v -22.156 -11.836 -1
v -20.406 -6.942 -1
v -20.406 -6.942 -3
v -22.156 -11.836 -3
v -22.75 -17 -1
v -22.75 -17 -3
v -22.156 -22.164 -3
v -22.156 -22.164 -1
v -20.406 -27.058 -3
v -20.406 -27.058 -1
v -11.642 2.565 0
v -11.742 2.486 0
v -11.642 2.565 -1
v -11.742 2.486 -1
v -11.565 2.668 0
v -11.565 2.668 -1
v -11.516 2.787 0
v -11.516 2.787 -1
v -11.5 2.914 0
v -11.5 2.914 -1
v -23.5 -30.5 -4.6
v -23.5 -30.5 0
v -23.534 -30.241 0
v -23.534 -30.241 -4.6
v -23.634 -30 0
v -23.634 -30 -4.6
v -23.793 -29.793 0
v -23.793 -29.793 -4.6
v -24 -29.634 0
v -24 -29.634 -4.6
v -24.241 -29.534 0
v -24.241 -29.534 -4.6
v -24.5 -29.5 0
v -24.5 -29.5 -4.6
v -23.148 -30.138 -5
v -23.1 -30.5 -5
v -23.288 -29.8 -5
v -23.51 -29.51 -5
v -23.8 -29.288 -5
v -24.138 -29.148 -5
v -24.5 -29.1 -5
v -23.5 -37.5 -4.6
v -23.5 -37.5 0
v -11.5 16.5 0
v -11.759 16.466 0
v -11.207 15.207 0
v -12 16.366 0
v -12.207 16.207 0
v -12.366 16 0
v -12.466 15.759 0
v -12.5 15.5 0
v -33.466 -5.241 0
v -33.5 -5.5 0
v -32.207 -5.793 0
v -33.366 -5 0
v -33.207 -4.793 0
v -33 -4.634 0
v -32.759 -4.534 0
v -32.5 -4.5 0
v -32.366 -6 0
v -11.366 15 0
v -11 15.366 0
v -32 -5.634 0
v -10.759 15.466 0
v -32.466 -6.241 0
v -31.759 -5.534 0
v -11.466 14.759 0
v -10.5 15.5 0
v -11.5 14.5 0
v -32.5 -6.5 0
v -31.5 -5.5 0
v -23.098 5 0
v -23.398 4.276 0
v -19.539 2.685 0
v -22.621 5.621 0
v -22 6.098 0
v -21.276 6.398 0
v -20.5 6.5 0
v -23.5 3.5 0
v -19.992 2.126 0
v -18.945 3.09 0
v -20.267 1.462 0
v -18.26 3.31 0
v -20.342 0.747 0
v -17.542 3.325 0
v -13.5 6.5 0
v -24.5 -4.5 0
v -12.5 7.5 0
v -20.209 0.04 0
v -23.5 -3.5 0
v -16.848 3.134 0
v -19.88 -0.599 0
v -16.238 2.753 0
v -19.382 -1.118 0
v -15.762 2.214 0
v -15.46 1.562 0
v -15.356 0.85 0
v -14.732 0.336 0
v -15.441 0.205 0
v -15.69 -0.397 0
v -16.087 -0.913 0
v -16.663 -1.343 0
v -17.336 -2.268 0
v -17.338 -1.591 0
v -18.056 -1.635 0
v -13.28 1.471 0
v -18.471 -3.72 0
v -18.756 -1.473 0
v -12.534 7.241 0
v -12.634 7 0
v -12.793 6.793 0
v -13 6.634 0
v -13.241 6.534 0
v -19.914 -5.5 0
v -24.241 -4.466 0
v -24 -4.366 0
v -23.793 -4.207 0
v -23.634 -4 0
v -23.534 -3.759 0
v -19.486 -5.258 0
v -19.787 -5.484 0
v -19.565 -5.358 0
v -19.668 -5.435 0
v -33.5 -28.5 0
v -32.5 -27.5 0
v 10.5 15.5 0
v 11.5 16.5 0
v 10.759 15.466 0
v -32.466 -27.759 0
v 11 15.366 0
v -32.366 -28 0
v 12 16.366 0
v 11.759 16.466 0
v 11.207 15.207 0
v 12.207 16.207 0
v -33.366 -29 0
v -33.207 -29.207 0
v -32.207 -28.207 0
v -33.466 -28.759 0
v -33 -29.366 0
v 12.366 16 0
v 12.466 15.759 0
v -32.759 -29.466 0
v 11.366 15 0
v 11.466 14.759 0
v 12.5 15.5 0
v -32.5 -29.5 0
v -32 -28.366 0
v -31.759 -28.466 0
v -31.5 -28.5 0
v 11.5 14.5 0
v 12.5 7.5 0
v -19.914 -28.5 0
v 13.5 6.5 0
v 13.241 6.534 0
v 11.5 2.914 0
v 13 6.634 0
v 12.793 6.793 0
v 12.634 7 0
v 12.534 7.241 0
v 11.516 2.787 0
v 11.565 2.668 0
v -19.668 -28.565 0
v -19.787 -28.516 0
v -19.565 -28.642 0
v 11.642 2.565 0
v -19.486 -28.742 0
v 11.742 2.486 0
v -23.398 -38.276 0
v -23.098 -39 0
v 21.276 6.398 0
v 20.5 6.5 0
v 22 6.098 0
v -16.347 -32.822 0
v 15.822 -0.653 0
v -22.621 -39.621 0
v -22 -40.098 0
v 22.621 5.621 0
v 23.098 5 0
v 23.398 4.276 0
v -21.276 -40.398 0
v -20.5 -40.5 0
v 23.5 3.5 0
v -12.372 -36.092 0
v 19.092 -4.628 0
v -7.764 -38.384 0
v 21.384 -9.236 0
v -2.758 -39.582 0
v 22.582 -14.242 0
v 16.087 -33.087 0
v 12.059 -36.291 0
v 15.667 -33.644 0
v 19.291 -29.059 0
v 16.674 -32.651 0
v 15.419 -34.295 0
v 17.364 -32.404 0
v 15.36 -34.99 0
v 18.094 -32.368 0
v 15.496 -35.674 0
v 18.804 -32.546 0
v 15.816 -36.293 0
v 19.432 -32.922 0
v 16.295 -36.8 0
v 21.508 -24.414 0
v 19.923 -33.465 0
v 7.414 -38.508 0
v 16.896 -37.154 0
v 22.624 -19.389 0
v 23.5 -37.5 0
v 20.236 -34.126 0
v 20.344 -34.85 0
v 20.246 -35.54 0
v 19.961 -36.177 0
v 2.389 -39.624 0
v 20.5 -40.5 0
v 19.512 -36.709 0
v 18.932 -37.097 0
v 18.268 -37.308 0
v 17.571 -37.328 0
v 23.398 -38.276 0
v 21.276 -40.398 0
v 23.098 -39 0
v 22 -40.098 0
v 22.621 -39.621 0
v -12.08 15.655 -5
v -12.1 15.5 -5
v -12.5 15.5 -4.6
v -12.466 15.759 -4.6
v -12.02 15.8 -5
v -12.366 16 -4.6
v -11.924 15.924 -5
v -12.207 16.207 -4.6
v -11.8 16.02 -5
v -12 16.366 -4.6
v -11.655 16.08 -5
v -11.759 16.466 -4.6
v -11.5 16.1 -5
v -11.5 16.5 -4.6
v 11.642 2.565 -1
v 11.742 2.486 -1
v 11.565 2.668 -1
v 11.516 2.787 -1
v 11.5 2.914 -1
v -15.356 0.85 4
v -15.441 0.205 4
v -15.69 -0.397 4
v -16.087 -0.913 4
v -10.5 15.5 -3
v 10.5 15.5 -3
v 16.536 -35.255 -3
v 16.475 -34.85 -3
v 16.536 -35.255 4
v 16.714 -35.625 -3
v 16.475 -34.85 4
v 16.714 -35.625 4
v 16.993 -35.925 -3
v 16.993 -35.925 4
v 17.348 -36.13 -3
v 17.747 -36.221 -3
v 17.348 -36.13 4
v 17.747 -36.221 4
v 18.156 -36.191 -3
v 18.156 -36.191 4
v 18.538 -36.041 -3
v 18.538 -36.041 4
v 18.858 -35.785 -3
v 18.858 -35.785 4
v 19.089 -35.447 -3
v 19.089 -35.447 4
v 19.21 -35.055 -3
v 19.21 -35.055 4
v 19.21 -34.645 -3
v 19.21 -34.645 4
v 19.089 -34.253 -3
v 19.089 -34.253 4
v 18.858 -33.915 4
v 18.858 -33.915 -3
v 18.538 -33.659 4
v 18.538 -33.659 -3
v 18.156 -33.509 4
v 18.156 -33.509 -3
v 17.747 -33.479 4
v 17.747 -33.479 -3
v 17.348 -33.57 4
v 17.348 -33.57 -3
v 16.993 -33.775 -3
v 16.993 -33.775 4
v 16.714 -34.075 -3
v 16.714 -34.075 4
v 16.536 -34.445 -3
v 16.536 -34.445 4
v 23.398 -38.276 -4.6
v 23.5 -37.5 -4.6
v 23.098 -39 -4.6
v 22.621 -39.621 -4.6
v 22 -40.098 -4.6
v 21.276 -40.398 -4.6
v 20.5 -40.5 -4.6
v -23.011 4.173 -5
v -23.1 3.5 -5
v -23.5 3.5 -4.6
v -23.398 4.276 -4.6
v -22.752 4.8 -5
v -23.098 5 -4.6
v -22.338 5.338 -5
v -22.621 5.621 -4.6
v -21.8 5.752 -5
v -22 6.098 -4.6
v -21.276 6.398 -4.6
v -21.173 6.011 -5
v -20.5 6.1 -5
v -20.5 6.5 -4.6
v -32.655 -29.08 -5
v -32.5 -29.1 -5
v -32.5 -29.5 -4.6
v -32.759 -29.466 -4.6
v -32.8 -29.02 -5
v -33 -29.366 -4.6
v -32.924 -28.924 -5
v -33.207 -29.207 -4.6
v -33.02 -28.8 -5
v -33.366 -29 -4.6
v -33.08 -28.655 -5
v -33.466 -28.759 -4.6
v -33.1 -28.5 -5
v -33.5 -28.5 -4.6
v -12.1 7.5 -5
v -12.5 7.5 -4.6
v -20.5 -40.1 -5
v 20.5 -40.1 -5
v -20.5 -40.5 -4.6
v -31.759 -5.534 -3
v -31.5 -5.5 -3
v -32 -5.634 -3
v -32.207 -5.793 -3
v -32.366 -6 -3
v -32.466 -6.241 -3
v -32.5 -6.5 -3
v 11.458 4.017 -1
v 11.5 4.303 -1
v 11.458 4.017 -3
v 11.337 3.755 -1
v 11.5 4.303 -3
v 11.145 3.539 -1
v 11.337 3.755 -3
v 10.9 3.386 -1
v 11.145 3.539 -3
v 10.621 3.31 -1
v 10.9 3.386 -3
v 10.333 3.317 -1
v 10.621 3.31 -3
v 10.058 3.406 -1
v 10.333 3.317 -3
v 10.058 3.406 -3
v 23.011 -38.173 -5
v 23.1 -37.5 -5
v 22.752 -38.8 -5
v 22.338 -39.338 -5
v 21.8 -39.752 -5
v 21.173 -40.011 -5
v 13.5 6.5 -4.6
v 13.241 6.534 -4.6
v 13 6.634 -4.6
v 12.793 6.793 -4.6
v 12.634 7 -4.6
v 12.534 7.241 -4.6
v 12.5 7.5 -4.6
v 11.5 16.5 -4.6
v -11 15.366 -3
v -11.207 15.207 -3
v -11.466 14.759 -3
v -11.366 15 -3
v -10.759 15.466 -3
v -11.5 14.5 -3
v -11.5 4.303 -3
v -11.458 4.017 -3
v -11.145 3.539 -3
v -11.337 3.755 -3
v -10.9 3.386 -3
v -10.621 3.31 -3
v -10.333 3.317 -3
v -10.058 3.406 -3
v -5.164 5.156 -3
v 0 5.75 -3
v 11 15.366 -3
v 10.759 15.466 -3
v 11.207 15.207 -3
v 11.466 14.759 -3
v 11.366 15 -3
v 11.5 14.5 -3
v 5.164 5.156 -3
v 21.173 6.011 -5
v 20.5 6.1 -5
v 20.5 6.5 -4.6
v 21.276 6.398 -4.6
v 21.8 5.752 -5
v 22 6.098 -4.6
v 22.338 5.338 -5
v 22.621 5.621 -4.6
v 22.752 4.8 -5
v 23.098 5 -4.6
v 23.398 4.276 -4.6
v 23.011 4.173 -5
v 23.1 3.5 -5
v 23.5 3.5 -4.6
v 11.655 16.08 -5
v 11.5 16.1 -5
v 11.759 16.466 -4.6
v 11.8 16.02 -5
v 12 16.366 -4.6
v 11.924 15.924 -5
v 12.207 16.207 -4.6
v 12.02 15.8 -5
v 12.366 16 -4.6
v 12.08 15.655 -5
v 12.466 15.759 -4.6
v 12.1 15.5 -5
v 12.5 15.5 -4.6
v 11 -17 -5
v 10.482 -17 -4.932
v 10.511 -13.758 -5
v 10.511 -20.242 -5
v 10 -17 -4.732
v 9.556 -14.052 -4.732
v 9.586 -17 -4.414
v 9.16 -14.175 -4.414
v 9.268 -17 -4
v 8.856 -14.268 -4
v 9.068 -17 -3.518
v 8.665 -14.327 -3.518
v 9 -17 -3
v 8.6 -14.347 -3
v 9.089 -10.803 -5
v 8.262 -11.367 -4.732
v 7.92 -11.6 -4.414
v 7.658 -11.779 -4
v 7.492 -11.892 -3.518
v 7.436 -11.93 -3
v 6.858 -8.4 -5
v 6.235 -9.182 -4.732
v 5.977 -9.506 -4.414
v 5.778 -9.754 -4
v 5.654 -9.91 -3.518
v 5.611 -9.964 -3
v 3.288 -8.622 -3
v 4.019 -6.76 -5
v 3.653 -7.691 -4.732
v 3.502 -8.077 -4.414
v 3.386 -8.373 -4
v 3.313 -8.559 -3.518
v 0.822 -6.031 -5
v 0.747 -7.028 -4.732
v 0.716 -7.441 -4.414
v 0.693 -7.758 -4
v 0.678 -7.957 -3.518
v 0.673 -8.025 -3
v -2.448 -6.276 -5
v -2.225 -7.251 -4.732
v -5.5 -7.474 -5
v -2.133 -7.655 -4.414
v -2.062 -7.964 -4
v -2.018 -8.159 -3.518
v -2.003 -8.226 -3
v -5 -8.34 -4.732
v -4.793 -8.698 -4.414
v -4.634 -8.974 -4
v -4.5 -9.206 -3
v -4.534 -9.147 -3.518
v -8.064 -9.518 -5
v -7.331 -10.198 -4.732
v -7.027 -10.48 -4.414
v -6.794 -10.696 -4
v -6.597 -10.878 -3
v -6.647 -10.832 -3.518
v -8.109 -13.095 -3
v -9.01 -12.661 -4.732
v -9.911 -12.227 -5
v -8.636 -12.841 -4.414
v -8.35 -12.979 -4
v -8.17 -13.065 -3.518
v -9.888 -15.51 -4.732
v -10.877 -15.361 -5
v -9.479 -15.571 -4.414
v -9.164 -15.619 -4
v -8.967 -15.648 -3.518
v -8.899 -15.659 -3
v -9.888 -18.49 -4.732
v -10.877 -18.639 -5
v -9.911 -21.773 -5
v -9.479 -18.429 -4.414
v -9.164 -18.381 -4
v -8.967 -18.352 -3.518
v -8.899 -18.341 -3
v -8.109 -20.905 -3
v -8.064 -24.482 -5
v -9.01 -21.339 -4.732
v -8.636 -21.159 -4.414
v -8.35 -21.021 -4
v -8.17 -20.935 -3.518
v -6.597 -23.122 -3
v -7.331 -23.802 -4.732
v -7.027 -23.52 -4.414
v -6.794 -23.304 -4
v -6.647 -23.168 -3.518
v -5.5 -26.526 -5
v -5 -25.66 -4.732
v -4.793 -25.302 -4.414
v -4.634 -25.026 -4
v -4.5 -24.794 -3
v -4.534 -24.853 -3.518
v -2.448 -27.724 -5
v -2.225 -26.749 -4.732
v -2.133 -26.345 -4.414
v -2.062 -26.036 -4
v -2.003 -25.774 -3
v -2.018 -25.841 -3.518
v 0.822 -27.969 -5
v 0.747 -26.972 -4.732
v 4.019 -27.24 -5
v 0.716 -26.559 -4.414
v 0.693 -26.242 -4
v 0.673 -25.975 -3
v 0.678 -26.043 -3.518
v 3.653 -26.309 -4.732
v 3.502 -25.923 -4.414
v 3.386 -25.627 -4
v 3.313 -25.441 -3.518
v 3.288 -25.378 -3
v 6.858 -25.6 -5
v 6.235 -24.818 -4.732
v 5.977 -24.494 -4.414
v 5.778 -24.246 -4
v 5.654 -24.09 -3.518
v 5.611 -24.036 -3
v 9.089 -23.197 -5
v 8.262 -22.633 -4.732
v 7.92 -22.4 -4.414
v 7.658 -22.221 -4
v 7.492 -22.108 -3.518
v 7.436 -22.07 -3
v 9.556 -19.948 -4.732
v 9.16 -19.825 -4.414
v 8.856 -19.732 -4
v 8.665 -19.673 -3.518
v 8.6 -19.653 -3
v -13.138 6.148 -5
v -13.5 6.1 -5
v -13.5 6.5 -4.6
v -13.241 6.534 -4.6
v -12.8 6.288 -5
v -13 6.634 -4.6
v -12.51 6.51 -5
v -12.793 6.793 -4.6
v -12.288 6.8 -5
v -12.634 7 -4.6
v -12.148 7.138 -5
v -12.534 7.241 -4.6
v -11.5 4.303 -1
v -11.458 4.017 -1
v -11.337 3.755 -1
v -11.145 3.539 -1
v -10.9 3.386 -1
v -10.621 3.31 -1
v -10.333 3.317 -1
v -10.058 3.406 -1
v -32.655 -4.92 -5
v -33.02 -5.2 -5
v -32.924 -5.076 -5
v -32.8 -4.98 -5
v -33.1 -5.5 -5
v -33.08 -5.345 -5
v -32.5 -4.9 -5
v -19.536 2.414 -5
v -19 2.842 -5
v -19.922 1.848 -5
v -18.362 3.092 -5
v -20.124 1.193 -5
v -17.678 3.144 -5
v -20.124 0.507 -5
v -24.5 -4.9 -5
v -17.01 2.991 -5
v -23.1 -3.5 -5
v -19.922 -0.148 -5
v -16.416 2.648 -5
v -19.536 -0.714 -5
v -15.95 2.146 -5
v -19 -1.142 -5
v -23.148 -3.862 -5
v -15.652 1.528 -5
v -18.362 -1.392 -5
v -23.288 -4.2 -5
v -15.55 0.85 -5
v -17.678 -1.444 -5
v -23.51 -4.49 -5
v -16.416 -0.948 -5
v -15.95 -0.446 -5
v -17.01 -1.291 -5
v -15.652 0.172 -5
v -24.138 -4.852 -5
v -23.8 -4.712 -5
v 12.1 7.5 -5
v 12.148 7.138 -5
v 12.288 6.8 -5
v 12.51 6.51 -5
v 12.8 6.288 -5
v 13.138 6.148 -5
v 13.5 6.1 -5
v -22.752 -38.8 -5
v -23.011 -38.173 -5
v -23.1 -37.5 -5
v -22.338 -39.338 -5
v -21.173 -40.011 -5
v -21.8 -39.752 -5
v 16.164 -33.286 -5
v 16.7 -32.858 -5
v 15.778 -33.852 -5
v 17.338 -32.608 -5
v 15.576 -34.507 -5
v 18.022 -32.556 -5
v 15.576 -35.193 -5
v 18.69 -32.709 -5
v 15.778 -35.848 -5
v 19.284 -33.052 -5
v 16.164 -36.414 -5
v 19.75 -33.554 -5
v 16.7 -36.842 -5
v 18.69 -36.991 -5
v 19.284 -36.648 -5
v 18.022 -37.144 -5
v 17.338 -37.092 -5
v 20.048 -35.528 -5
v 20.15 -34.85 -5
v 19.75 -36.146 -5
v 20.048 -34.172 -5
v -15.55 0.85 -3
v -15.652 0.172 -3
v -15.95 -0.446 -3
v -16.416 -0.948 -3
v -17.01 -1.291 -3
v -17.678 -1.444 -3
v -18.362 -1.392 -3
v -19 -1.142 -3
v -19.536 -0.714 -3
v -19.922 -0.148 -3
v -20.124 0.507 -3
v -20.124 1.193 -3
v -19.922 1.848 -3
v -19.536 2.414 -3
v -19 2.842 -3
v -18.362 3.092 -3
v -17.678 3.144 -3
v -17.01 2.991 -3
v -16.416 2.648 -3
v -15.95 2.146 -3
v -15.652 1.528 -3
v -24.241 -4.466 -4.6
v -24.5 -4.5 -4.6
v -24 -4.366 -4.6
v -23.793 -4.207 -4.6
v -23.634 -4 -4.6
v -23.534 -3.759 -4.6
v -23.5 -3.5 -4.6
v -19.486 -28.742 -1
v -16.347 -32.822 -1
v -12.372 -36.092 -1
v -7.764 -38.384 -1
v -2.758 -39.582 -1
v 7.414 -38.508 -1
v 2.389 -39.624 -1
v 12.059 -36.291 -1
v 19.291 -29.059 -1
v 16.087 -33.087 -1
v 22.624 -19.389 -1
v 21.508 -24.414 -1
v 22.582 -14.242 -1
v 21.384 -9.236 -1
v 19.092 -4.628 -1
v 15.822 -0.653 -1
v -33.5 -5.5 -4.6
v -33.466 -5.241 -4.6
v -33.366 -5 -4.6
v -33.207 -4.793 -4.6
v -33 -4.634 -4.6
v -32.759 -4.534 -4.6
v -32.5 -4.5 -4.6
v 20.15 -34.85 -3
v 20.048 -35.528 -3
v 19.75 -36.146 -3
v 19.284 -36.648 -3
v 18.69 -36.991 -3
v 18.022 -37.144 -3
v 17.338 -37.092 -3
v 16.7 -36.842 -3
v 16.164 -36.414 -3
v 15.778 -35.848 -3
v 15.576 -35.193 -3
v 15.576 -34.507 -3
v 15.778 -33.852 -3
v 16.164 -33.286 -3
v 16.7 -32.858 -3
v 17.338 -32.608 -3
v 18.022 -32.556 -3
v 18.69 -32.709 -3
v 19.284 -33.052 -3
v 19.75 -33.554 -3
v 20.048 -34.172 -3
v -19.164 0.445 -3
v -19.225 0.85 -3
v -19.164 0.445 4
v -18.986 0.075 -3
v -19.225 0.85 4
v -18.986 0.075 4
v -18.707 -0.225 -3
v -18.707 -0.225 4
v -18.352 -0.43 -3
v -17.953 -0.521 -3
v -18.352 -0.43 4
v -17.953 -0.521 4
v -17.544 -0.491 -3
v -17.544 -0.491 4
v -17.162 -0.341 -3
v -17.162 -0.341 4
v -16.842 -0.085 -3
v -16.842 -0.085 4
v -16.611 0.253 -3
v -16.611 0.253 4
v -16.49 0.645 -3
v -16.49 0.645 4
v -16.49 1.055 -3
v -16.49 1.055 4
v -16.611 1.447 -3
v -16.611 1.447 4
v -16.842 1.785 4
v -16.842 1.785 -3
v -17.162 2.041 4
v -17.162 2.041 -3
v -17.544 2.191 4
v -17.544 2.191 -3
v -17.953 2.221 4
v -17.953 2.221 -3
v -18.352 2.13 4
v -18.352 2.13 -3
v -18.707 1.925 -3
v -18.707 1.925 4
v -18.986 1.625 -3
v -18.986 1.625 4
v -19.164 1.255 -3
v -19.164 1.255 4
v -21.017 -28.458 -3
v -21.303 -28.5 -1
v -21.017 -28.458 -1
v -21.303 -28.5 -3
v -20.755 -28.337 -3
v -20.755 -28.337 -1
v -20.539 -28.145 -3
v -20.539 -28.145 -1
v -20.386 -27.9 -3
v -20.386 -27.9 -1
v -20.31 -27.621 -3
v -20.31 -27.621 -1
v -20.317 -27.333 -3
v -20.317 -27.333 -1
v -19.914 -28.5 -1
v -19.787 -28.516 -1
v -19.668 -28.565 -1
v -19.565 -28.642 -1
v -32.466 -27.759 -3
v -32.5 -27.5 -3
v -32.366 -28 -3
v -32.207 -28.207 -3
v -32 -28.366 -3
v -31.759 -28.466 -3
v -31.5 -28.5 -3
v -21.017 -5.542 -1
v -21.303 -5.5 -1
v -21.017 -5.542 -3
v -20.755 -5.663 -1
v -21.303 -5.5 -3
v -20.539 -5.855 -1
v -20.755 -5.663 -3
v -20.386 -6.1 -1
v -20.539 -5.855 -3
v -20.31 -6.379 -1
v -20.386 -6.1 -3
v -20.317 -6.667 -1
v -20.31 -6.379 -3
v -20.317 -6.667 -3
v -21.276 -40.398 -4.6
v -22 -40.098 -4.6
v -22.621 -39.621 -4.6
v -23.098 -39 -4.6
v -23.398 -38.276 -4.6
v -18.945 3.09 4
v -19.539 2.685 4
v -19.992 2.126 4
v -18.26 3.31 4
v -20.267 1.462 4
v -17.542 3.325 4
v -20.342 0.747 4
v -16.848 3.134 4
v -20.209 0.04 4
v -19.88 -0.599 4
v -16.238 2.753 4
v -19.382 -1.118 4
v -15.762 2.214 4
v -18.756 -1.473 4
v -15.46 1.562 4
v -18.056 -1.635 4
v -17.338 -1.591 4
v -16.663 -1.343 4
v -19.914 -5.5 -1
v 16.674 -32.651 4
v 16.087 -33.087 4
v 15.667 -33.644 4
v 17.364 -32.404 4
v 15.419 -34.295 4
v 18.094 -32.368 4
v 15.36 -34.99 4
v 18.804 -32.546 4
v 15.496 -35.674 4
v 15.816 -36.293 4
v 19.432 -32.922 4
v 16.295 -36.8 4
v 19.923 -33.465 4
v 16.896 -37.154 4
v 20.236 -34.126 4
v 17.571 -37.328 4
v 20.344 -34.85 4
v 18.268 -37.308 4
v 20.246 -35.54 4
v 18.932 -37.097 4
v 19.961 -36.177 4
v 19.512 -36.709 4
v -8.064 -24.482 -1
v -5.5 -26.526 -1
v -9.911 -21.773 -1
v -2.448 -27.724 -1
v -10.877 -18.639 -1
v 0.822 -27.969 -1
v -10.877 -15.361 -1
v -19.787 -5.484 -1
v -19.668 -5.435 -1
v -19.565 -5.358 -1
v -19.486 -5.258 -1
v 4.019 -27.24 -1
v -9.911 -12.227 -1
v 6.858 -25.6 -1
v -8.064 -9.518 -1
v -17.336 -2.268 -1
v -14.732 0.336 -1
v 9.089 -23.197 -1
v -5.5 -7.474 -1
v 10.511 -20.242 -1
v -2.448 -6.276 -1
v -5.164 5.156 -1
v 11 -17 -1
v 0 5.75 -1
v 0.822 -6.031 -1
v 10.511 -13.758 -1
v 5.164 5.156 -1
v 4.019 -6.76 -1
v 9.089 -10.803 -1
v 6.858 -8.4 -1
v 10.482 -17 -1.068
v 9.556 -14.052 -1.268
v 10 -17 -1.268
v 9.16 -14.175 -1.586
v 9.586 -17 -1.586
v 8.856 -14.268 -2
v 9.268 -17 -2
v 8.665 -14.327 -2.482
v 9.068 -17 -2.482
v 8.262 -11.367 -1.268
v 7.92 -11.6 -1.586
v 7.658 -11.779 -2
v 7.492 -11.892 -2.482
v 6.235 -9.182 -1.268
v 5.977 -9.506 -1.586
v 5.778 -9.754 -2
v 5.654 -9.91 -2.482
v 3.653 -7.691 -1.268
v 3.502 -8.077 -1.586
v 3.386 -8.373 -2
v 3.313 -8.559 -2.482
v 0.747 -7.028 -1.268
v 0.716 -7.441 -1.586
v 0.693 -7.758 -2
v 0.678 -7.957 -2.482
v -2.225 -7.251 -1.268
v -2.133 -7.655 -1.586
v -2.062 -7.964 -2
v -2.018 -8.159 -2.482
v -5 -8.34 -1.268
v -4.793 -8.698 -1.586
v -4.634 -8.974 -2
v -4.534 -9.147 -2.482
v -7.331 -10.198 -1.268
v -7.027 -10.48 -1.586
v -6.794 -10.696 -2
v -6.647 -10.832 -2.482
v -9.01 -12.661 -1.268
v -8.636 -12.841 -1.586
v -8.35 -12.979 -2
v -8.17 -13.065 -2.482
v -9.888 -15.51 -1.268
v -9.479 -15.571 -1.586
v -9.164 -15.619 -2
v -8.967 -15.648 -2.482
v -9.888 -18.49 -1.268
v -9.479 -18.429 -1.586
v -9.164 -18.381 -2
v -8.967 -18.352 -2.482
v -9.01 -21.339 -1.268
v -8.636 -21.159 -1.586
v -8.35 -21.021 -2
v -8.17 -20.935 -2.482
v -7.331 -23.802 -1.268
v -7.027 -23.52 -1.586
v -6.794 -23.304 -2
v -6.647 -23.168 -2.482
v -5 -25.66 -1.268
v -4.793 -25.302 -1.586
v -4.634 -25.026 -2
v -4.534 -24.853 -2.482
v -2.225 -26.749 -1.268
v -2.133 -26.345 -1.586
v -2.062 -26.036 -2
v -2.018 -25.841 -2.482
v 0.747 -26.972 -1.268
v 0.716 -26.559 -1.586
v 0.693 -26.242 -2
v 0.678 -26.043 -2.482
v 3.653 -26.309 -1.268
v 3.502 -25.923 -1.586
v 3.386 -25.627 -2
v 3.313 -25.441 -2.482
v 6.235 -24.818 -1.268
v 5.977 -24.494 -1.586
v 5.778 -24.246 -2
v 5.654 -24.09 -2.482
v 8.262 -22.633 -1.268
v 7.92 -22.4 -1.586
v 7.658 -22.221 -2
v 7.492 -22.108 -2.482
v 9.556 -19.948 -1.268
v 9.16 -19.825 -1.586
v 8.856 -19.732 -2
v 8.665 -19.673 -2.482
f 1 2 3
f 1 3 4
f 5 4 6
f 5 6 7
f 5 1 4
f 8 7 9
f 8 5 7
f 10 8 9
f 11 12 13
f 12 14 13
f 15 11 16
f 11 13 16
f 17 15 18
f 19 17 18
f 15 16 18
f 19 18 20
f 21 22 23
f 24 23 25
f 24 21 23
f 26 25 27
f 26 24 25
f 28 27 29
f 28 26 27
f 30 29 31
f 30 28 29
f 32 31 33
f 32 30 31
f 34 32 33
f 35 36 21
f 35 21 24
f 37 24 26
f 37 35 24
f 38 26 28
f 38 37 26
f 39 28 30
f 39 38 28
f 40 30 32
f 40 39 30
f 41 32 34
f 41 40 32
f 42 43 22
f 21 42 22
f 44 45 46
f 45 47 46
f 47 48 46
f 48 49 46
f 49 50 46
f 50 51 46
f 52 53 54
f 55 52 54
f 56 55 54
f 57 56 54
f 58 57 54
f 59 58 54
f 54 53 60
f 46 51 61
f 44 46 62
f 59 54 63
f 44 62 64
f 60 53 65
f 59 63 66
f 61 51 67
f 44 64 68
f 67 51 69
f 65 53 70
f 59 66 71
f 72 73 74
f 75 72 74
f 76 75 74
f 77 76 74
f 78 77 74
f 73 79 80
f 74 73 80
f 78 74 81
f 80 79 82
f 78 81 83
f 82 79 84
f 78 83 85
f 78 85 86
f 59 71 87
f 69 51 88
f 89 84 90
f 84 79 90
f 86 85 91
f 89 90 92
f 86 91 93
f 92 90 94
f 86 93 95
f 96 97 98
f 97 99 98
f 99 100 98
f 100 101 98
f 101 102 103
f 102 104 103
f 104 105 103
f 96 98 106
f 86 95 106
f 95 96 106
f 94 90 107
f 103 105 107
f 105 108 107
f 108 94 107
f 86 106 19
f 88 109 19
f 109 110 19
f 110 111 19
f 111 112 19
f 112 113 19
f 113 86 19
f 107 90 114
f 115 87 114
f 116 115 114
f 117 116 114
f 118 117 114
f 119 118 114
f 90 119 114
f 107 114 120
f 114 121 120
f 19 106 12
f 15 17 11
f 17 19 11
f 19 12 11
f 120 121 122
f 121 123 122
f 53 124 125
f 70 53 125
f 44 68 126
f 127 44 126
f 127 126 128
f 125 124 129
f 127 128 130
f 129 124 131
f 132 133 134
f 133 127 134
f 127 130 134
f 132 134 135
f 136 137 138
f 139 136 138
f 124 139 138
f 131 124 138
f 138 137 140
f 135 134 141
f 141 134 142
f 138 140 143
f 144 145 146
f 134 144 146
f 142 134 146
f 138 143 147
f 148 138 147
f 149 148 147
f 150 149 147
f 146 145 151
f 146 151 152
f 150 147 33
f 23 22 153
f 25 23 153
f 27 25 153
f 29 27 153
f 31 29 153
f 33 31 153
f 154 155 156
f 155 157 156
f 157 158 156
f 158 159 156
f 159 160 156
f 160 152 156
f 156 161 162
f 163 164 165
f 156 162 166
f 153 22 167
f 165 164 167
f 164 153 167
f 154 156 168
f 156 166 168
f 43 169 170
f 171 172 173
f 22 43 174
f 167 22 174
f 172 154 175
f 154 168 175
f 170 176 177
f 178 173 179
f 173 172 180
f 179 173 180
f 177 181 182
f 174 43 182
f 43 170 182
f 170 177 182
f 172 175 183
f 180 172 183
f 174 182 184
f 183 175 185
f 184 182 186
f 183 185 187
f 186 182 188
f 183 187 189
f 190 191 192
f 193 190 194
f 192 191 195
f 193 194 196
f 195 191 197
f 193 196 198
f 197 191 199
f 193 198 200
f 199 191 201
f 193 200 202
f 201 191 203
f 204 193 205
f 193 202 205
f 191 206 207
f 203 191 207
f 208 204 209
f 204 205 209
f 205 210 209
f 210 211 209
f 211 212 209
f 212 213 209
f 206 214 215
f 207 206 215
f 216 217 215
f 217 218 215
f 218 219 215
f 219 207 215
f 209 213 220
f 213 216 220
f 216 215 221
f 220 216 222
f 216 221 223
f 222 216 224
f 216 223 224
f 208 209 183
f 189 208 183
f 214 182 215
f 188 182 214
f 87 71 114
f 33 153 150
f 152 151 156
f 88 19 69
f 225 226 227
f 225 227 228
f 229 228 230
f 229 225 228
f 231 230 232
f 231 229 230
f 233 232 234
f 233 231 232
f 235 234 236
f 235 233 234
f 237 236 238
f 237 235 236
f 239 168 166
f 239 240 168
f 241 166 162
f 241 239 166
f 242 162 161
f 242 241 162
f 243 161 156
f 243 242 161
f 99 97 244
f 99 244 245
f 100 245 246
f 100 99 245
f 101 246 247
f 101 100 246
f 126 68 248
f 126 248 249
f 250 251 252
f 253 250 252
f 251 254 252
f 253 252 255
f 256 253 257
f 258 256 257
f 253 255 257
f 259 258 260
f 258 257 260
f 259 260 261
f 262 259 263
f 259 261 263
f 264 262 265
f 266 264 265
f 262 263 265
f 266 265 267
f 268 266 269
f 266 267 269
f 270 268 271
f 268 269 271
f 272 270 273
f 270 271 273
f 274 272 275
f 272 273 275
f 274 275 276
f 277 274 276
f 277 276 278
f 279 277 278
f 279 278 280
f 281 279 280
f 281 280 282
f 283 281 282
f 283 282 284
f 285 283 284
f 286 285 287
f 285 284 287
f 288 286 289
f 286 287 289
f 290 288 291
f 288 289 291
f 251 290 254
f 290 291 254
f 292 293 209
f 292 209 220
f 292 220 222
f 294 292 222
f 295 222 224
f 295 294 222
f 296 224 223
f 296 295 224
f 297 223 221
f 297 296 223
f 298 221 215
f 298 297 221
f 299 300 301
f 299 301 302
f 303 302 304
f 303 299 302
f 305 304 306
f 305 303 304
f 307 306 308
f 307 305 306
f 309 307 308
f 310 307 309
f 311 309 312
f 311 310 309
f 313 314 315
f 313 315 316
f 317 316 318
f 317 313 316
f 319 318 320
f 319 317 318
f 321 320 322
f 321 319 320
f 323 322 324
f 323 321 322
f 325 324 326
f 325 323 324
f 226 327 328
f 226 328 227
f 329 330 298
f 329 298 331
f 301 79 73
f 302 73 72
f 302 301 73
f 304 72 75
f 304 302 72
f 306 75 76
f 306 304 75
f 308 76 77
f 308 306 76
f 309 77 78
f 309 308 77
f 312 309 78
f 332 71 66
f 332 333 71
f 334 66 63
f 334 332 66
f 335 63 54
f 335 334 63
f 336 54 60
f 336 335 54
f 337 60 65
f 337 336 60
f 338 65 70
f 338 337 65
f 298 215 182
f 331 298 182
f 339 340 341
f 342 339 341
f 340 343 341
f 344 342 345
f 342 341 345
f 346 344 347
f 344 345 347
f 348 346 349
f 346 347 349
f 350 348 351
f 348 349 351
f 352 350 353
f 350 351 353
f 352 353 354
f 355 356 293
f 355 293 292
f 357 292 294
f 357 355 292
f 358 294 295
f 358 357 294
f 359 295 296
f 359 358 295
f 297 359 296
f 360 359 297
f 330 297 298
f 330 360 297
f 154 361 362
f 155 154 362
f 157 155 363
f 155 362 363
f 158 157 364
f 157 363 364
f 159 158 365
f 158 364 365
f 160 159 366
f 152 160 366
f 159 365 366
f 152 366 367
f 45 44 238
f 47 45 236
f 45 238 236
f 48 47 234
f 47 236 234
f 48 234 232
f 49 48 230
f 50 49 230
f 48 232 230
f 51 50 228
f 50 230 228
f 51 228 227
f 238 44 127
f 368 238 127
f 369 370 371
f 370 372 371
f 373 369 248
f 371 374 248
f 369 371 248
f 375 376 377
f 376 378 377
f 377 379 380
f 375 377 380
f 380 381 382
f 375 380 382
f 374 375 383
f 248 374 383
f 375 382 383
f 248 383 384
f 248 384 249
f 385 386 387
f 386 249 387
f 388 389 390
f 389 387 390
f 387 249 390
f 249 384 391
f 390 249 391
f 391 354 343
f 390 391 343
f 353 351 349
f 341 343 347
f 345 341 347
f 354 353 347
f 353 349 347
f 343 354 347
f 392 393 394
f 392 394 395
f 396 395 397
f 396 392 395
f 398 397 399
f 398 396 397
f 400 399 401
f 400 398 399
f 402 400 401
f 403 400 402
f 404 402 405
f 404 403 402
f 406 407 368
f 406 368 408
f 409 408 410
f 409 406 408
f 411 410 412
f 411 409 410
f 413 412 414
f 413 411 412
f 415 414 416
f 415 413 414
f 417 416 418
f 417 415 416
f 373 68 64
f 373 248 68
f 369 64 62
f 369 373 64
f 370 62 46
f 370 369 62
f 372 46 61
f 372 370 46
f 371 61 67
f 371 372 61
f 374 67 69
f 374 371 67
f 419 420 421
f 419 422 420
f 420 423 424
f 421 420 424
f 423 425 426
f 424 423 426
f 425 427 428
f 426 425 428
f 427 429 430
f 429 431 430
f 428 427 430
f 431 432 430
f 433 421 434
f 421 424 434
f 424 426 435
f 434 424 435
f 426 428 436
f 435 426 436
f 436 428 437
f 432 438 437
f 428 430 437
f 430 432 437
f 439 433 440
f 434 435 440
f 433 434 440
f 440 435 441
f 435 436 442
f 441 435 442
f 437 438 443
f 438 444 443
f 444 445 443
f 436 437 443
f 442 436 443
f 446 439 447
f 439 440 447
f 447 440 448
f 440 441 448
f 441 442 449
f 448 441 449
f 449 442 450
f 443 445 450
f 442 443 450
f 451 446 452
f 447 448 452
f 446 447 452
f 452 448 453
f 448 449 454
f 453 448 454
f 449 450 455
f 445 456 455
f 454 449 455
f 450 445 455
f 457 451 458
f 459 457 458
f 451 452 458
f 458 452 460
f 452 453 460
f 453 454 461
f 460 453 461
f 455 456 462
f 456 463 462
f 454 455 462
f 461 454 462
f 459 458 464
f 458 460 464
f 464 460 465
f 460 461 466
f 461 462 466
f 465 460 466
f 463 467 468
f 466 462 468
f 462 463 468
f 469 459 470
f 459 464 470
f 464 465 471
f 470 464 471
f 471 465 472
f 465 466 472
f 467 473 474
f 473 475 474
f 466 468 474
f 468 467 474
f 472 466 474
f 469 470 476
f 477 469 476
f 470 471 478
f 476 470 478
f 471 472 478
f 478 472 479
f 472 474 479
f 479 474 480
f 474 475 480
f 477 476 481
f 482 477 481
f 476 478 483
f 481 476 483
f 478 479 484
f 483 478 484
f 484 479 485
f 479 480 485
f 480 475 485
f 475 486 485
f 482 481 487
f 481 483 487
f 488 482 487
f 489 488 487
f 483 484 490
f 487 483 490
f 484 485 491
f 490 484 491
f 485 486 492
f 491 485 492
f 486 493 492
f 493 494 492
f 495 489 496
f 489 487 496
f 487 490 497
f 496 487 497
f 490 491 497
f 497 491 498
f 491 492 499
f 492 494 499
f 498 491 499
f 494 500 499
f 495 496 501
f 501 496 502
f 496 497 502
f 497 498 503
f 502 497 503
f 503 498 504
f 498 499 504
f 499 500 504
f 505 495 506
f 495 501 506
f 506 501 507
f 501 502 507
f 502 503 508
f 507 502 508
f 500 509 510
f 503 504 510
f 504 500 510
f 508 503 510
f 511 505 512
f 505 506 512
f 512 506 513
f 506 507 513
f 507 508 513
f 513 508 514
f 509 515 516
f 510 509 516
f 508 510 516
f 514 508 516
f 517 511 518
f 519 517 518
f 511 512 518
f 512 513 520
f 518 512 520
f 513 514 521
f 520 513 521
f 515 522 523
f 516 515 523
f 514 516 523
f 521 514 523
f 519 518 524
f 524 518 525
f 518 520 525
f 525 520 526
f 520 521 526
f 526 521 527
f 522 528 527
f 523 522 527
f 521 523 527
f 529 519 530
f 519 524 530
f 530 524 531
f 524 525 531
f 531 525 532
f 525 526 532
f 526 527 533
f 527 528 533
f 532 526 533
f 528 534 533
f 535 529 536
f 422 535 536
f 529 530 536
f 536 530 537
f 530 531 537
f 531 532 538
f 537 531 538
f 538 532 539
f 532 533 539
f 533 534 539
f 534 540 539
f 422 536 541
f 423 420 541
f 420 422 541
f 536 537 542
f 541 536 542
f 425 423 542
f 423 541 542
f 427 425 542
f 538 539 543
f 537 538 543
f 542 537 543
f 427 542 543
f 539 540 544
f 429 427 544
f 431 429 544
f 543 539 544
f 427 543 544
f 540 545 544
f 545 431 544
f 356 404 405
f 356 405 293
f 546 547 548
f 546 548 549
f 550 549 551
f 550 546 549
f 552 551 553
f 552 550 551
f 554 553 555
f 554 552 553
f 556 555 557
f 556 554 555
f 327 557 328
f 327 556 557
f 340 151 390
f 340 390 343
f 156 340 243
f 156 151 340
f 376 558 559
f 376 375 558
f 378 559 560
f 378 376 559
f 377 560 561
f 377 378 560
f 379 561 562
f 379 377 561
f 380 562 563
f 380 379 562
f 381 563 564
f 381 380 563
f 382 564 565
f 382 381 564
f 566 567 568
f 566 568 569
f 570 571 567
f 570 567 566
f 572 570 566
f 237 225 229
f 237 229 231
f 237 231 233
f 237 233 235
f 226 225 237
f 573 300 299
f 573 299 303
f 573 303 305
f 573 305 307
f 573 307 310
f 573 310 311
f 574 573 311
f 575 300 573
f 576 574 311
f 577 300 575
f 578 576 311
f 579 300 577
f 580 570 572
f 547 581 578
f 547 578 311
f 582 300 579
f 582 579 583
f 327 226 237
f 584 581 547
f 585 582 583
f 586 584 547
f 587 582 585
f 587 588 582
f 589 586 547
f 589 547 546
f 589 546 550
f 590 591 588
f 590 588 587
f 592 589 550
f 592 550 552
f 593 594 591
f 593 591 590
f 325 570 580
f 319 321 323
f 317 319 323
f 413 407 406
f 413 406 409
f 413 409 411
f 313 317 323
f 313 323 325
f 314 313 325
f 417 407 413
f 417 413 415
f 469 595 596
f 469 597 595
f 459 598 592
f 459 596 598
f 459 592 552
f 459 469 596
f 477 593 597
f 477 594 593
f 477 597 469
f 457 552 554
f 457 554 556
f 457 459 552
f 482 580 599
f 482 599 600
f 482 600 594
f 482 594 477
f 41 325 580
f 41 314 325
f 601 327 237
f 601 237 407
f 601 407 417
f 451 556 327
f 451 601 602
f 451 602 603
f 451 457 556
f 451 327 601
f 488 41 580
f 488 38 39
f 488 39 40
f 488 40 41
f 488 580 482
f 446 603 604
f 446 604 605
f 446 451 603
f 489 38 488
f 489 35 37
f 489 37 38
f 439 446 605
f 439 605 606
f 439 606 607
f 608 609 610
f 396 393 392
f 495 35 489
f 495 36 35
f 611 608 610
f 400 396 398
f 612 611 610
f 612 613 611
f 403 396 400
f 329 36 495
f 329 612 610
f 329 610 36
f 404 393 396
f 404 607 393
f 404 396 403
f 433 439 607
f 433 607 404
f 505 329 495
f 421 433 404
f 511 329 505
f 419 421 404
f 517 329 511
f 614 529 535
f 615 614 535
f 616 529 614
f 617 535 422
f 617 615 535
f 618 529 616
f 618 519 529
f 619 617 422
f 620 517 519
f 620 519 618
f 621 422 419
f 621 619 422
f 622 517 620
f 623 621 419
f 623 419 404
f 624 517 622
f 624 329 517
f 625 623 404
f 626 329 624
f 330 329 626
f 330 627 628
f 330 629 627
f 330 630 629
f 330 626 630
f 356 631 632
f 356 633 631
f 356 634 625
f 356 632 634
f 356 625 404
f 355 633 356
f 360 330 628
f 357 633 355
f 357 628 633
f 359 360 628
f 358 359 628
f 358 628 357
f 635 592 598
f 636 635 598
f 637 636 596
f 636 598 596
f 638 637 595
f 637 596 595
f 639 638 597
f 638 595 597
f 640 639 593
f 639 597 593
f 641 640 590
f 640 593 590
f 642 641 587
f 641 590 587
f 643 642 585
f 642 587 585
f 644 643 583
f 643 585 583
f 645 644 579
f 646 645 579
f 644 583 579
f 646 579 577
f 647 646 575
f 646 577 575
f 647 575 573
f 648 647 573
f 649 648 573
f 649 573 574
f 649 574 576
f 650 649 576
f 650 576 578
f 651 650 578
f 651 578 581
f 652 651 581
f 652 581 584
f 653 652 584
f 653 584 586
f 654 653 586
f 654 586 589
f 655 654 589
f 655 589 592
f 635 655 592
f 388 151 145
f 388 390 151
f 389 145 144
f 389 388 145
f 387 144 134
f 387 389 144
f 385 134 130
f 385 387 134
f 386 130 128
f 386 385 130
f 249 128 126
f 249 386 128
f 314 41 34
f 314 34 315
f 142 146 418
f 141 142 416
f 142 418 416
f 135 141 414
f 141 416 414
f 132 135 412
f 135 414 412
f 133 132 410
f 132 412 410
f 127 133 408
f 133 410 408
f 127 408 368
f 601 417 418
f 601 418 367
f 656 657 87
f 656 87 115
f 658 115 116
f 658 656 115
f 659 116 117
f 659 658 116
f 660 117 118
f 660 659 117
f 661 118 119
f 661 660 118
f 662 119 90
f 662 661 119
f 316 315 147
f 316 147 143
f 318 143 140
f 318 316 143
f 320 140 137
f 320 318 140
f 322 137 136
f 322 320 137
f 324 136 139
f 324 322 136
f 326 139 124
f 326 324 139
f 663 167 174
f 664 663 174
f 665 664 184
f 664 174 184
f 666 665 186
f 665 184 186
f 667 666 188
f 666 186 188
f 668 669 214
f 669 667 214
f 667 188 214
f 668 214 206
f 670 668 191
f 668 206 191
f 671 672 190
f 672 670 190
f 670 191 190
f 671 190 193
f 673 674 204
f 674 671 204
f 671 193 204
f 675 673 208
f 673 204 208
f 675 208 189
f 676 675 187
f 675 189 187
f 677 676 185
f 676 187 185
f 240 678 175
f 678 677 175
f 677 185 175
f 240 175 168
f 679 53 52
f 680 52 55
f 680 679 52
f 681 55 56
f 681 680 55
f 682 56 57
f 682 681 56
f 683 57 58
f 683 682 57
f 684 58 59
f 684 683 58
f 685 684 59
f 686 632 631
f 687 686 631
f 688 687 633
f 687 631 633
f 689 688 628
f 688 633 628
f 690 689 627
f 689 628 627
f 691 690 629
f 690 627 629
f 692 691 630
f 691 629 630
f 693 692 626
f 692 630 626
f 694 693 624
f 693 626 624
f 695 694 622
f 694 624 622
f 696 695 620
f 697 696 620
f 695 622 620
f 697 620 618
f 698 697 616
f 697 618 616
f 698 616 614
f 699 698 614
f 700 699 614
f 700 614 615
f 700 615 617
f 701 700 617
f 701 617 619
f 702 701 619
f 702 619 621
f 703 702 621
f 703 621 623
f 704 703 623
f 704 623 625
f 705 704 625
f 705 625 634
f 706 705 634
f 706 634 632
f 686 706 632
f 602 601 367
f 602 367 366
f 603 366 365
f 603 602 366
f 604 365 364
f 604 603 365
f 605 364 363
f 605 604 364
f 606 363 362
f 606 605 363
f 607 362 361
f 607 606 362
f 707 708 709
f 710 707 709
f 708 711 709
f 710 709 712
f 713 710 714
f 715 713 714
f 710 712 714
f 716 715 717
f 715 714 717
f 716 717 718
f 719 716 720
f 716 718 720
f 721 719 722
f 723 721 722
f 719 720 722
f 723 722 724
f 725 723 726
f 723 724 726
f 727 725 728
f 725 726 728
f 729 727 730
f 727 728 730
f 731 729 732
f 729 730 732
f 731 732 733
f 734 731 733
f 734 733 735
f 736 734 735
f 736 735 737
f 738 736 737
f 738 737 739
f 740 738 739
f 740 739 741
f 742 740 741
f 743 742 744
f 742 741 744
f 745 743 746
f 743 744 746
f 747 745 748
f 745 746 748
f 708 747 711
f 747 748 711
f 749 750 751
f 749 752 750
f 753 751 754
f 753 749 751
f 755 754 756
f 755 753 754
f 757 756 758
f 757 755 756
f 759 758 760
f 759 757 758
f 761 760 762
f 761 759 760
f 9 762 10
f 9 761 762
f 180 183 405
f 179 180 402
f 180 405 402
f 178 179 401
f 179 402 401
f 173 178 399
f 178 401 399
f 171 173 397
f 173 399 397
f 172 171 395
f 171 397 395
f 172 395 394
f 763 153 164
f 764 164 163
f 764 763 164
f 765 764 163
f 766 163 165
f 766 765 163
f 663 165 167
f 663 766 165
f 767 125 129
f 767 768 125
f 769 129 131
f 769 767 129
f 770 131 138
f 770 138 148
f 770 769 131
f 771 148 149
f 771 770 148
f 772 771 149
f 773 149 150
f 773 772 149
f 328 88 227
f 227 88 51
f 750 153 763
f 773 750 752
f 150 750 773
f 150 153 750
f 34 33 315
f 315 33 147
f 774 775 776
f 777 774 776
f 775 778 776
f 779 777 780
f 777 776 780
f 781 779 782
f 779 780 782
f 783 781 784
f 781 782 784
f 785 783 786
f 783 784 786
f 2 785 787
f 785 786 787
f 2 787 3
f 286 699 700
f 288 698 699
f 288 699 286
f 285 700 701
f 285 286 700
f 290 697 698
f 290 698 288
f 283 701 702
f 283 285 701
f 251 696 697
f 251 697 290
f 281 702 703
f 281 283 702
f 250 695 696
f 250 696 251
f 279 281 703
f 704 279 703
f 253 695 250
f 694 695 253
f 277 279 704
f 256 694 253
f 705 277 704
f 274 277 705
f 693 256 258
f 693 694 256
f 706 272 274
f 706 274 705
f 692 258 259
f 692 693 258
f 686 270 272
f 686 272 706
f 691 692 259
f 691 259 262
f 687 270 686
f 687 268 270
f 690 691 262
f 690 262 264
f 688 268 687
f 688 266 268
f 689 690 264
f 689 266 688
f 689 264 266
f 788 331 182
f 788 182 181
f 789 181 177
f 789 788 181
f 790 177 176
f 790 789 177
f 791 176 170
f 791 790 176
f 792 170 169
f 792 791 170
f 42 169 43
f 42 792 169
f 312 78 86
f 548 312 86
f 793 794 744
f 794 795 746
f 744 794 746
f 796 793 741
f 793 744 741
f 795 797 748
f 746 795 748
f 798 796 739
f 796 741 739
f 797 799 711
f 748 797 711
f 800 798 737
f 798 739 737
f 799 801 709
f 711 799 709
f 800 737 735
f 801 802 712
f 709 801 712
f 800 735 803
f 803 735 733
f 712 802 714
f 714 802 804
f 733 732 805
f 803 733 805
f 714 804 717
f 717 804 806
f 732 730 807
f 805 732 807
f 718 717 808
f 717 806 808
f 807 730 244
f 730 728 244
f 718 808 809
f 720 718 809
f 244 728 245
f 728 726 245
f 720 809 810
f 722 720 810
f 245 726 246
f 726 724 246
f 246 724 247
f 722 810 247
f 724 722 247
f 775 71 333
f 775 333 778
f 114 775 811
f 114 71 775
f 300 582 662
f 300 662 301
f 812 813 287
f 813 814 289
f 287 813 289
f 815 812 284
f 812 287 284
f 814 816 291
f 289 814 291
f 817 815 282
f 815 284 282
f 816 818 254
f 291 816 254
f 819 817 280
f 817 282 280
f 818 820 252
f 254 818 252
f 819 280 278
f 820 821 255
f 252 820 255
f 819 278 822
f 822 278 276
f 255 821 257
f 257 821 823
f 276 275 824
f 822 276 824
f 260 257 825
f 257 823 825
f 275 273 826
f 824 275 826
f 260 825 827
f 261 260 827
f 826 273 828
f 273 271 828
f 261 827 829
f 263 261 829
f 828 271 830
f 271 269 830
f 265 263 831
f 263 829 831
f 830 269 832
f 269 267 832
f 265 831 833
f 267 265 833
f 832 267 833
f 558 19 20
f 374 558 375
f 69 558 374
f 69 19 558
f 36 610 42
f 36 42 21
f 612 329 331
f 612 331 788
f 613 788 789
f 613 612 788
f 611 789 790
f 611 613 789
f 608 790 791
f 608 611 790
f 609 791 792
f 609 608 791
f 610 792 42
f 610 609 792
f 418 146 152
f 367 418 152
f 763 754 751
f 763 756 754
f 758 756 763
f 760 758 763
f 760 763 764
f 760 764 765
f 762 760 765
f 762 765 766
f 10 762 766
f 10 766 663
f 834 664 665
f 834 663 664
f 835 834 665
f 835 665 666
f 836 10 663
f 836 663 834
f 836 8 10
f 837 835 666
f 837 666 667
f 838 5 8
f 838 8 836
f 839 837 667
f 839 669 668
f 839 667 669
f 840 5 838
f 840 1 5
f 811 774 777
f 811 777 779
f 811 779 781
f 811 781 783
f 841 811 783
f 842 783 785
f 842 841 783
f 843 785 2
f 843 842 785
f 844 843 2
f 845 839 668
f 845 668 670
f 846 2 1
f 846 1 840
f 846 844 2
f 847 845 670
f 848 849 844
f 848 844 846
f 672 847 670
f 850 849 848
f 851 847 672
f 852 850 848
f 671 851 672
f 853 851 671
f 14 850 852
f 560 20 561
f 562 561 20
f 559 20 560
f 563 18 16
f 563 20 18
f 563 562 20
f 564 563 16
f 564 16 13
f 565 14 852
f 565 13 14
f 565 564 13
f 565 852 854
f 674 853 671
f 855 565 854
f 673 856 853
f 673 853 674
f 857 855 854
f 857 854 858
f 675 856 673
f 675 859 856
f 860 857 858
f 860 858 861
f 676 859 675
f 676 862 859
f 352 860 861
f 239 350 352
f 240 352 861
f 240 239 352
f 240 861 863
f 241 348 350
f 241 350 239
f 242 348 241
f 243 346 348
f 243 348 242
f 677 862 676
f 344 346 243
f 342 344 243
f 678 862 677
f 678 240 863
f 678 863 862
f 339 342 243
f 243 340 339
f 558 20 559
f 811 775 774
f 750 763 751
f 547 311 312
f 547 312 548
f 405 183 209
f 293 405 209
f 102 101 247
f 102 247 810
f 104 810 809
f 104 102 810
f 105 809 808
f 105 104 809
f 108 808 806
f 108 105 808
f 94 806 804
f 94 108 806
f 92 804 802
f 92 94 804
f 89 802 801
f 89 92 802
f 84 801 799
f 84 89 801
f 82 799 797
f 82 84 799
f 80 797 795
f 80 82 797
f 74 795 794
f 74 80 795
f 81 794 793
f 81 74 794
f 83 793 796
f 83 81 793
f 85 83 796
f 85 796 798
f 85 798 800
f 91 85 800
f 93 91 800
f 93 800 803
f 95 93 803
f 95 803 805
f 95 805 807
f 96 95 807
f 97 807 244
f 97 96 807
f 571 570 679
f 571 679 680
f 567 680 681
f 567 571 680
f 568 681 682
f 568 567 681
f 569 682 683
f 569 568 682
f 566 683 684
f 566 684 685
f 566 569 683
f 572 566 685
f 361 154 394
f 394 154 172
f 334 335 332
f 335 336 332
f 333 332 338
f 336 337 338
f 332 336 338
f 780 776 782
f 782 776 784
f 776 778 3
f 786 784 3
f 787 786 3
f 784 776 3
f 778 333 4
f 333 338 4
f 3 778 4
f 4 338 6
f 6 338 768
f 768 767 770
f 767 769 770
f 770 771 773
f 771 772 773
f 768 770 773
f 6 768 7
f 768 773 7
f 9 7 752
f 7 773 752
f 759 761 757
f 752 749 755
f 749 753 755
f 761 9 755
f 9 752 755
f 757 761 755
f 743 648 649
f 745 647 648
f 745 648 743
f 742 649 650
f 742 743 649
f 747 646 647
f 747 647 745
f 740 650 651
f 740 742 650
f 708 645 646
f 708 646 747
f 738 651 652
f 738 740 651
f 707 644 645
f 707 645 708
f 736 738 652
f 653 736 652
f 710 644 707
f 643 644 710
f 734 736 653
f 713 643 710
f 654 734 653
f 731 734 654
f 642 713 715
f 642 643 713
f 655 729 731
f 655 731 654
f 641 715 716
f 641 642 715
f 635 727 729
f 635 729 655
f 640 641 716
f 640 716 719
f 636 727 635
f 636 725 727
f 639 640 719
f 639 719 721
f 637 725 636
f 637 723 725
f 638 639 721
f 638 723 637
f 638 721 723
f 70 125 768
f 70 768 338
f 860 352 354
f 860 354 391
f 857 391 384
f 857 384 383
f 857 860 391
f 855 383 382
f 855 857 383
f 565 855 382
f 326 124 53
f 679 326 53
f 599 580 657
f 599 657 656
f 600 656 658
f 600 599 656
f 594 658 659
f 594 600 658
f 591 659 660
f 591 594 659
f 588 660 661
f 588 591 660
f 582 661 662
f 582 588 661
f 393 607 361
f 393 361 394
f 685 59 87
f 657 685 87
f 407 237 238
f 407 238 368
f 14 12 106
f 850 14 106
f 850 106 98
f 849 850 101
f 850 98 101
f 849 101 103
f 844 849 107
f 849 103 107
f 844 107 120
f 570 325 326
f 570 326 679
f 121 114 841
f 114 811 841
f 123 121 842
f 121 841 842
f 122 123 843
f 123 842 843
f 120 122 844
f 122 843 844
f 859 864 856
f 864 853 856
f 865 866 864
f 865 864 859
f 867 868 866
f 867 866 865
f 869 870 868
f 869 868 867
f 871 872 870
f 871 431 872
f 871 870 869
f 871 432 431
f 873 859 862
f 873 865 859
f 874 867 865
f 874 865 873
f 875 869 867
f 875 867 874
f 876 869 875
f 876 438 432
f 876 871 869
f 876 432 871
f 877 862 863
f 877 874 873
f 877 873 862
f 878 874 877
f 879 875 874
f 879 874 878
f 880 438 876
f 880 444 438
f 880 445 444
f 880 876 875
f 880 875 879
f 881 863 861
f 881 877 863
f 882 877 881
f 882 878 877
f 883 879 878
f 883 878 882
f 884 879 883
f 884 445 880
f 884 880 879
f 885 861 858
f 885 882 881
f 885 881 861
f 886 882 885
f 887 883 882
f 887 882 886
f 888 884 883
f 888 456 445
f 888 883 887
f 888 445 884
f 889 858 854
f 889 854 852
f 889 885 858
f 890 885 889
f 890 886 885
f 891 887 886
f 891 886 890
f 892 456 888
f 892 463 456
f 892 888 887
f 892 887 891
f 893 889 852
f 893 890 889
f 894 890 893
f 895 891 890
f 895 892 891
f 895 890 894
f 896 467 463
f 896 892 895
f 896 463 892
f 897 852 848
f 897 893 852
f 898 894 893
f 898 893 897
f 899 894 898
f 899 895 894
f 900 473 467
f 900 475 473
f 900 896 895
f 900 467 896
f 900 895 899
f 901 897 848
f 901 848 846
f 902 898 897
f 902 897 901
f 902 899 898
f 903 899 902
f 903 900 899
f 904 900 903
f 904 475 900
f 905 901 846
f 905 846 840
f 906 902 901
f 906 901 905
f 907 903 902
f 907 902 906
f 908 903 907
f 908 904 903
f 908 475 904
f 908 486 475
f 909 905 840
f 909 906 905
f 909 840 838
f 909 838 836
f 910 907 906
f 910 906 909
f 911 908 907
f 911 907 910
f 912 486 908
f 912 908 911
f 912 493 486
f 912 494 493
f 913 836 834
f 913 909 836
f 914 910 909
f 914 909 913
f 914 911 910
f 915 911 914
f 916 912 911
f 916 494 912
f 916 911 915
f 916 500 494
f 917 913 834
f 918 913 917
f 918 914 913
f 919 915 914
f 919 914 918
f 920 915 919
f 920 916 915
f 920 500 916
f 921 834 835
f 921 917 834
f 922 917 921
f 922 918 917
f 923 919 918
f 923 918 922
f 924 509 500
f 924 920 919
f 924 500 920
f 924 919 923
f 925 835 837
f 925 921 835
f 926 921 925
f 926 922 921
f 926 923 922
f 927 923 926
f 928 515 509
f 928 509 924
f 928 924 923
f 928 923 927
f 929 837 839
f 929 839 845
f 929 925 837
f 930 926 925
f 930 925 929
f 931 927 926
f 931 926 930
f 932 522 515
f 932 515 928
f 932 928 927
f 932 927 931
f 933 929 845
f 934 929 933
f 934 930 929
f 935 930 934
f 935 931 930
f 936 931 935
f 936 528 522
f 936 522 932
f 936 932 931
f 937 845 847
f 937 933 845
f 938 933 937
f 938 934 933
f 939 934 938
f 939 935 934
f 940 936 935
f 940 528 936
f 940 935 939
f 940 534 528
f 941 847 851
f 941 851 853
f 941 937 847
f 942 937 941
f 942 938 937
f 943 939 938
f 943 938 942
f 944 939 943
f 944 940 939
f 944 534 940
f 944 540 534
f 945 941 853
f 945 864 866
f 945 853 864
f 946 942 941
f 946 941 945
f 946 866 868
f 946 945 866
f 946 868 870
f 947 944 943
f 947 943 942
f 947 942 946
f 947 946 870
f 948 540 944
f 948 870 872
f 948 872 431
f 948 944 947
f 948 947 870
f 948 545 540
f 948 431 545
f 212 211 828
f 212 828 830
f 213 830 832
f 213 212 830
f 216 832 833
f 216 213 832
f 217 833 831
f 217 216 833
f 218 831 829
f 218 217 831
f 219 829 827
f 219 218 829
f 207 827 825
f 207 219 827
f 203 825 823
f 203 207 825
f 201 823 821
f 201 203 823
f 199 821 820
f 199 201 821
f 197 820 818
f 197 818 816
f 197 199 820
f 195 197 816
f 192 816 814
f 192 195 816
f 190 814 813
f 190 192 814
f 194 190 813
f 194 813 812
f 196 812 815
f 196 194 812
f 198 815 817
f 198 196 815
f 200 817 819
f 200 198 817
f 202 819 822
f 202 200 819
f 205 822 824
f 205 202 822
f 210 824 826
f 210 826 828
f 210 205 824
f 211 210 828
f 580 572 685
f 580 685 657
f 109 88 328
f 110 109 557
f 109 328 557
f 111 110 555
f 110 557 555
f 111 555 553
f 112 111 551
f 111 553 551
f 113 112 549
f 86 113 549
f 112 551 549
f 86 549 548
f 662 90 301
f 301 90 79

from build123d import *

# Parameters (mm, degrees)
F1_DEPTH        = 5
F2_R            = 22.75
F3_DEPTH        = 1
F5_DEPTH        = 4
F6_DEPTH        = 3
F7_R            = 9
F8_DEPTH        = 4.001
F9_R            = 3
F10_R           = 1
F11_R           = 0.5
F13_D           = 2.75
F13_CBORE_D     = 4.6
F13_CBORE_DEPTH = 2
F14_R           = 1.99999
F15_SIZE        = 0.4
F16_ANGLE       = 180


# Not quite as in the source:
# - a fillet or chamfer is up to 0.001 mm smaller than in the source, because OpenCascade refuses the exact size


with BuildPart() as f1:
    # F0 (on Top) → F1 (new body)
    with BuildSketch(Plane.XY):
        Polygon((23.5, -23.5), (23.5, 23.5), (-23.5, 23.5), (-23.5, 12.5), (-33.5, 12.5), (-33.5, -12.5), (-23.5, -12.5), (-23.5, -23.5), (-12.5, -23.5), (-12.5, -33.5), (12.5, -33.5), (12.5, -23.5), align=None)
    extrude(amount=F1_DEPTH)

    # F2 (on face) → F3 (cut)
    with BuildSketch(Plane(origin=(0, 0, 0), x_dir=(1, 0, 0), z_dir=(0, 0, -1))):
        Circle(F2_R)
    extrude(amount=-F3_DEPTH, mode=Mode.SUBTRACT)

    # F4 (on face) → F5 (join)
    with BuildSketch(Plane.XY):
        with BuildLine():
            ThreePointArc((-16.086679292, -16.086679252), (-20.153889553, -18.8043023144), (-15.3562879116, -17.85))
            ThreePointArc((-15.3562879116, -17.85), (-15.546110447, -16.8956976856), (-16.086679292, -16.086679252))
        make_face()
        with BuildLine():
            ThreePointArc((20.3437120884, 17.85), (16.8956976987, 20.1538895584), (16.086679272, 16.086679272))
            ThreePointArc((16.086679272, 16.086679272), (18.8043023013, 15.5461104416), (20.3437120884, 17.85))
        make_face()
    extrude(amount=-F5_DEPTH)

    # F4 (on face) → F6 (cut)
    with BuildSketch(Plane.XY):
        with BuildLine():
            ThreePointArc((11.5, -19.6293784925), (0, -22.75), (-11.5, -19.6293784925))
            Line((-11.5, -19.6293784925), (-11.5, -32.5))
            Line((-11.5, -32.5), (11.5, -32.5))
            Line((11.5, -32.5), (11.5, -19.6293784925))
        make_face()
        with BuildLine():
            Line((-32.5, -11.5), (-19.6293784925, -11.5))
            ThreePointArc((-19.6293784925, -11.5), (-22.75, 0), (-19.6293784925, 11.5))
            Line((-19.6293784925, 11.5), (-32.5, 11.5))
            Line((-32.5, 11.5), (-32.5, -11.5))
        make_face()
    extrude(amount=F6_DEPTH, mode=Mode.SUBTRACT)

    # F7 (on face) → F8 (cut, through all)
    with BuildSketch(Plane(origin=(0, 0, 1), x_dir=(1, 0, 0), z_dir=(0, 0, -1))):
        Circle(F7_R)
    extrude(amount=-F8_DEPTH, mode=Mode.SUBTRACT)

    # F9
    f9_edges = [f1.edges().sort_by_distance(p)[0] for p in [
        (-23.5, 23.5, 2.5),
        (23.5, 23.5, 2.5),
        (23.5, -23.5, 2.5),
        (-23.5, -23.5, 2.5),
    ]]
    fillet(f9_edges, radius=F9_R)

    # F10
    f10_edges = [f1.edges().sort_by_distance(p)[0] for p in [
        (-32.5, -11.5, 1.5),
        (-33.5, 12.5, 2.5),
        (-32.5, 11.5, 1.5),
        (-33.5, -12.5, 2.5),
        (-12.5, -33.5, 2.5),
        (12.5, -33.5, 2.5),
        (-11.5, -32.5, 1.5),
        (11.5, -32.5, 1.5),
        (-23.5, -12.5, 2.5),
        (-23.5, 12.5, 2.5),
        (-12.5, -23.5, 2.5),
        (12.5, -23.5, 2.5),
        (-19.629378, -11.5, 2),
        (-19.629378, 11.5, 2),
        (11.5, -19.629378, 2),
        (-11.5, -19.629378, 2),
    ]]
    fillet(f10_edges, radius=F10_R)

    # F11
    f11_edges = [f1.edges().sort_by_distance(p)[0] for p in [
        (-19.629378, -11.5, 0.5),
        (-11.5, -19.629378, 0.5),
        (11.5, -19.629378, 0.5),
        (-19.629378, 11.5, 0.5),
    ]]
    fillet(f11_edges, radius=F11_R)

    # F13 (through all)
    with Locations(Plane.XY.offset(5)):
        with Locations((-17.85, -17.85), (17.85, 17.85)):
            CounterBoreHole(F13_D / 2, F13_CBORE_D / 2, F13_CBORE_DEPTH)

    # F14 (radius 2 in the source; OpenCascade refuses exactly that, so slightly less here)
    f14_edges = [f1.edges().sort_by_distance(p)[0] for p in [
        (-9, 0, 5),
        (-9, 0, 1),
    ]]
    fillet(f14_edges, radius=F14_R)

    # F15
    f15_edges = [f1.edges().sort_by_distance(p)[0] for p in [
        (-33.5, 0, 5),
    ]]
    chamfer(f15_edges, length=F15_SIZE)


with BuildPart() as f1_1:
    # F16: moved
    add(f1.part.rotate(Axis((0, -33.5, 0), (-1, 0, 0)), F16_ANGLE))


with BuildPart() as f1_2:
    # F17: moved
    add(f1_1.part.moved(Location((0, 50, 0))))


solid = f1_2.part
